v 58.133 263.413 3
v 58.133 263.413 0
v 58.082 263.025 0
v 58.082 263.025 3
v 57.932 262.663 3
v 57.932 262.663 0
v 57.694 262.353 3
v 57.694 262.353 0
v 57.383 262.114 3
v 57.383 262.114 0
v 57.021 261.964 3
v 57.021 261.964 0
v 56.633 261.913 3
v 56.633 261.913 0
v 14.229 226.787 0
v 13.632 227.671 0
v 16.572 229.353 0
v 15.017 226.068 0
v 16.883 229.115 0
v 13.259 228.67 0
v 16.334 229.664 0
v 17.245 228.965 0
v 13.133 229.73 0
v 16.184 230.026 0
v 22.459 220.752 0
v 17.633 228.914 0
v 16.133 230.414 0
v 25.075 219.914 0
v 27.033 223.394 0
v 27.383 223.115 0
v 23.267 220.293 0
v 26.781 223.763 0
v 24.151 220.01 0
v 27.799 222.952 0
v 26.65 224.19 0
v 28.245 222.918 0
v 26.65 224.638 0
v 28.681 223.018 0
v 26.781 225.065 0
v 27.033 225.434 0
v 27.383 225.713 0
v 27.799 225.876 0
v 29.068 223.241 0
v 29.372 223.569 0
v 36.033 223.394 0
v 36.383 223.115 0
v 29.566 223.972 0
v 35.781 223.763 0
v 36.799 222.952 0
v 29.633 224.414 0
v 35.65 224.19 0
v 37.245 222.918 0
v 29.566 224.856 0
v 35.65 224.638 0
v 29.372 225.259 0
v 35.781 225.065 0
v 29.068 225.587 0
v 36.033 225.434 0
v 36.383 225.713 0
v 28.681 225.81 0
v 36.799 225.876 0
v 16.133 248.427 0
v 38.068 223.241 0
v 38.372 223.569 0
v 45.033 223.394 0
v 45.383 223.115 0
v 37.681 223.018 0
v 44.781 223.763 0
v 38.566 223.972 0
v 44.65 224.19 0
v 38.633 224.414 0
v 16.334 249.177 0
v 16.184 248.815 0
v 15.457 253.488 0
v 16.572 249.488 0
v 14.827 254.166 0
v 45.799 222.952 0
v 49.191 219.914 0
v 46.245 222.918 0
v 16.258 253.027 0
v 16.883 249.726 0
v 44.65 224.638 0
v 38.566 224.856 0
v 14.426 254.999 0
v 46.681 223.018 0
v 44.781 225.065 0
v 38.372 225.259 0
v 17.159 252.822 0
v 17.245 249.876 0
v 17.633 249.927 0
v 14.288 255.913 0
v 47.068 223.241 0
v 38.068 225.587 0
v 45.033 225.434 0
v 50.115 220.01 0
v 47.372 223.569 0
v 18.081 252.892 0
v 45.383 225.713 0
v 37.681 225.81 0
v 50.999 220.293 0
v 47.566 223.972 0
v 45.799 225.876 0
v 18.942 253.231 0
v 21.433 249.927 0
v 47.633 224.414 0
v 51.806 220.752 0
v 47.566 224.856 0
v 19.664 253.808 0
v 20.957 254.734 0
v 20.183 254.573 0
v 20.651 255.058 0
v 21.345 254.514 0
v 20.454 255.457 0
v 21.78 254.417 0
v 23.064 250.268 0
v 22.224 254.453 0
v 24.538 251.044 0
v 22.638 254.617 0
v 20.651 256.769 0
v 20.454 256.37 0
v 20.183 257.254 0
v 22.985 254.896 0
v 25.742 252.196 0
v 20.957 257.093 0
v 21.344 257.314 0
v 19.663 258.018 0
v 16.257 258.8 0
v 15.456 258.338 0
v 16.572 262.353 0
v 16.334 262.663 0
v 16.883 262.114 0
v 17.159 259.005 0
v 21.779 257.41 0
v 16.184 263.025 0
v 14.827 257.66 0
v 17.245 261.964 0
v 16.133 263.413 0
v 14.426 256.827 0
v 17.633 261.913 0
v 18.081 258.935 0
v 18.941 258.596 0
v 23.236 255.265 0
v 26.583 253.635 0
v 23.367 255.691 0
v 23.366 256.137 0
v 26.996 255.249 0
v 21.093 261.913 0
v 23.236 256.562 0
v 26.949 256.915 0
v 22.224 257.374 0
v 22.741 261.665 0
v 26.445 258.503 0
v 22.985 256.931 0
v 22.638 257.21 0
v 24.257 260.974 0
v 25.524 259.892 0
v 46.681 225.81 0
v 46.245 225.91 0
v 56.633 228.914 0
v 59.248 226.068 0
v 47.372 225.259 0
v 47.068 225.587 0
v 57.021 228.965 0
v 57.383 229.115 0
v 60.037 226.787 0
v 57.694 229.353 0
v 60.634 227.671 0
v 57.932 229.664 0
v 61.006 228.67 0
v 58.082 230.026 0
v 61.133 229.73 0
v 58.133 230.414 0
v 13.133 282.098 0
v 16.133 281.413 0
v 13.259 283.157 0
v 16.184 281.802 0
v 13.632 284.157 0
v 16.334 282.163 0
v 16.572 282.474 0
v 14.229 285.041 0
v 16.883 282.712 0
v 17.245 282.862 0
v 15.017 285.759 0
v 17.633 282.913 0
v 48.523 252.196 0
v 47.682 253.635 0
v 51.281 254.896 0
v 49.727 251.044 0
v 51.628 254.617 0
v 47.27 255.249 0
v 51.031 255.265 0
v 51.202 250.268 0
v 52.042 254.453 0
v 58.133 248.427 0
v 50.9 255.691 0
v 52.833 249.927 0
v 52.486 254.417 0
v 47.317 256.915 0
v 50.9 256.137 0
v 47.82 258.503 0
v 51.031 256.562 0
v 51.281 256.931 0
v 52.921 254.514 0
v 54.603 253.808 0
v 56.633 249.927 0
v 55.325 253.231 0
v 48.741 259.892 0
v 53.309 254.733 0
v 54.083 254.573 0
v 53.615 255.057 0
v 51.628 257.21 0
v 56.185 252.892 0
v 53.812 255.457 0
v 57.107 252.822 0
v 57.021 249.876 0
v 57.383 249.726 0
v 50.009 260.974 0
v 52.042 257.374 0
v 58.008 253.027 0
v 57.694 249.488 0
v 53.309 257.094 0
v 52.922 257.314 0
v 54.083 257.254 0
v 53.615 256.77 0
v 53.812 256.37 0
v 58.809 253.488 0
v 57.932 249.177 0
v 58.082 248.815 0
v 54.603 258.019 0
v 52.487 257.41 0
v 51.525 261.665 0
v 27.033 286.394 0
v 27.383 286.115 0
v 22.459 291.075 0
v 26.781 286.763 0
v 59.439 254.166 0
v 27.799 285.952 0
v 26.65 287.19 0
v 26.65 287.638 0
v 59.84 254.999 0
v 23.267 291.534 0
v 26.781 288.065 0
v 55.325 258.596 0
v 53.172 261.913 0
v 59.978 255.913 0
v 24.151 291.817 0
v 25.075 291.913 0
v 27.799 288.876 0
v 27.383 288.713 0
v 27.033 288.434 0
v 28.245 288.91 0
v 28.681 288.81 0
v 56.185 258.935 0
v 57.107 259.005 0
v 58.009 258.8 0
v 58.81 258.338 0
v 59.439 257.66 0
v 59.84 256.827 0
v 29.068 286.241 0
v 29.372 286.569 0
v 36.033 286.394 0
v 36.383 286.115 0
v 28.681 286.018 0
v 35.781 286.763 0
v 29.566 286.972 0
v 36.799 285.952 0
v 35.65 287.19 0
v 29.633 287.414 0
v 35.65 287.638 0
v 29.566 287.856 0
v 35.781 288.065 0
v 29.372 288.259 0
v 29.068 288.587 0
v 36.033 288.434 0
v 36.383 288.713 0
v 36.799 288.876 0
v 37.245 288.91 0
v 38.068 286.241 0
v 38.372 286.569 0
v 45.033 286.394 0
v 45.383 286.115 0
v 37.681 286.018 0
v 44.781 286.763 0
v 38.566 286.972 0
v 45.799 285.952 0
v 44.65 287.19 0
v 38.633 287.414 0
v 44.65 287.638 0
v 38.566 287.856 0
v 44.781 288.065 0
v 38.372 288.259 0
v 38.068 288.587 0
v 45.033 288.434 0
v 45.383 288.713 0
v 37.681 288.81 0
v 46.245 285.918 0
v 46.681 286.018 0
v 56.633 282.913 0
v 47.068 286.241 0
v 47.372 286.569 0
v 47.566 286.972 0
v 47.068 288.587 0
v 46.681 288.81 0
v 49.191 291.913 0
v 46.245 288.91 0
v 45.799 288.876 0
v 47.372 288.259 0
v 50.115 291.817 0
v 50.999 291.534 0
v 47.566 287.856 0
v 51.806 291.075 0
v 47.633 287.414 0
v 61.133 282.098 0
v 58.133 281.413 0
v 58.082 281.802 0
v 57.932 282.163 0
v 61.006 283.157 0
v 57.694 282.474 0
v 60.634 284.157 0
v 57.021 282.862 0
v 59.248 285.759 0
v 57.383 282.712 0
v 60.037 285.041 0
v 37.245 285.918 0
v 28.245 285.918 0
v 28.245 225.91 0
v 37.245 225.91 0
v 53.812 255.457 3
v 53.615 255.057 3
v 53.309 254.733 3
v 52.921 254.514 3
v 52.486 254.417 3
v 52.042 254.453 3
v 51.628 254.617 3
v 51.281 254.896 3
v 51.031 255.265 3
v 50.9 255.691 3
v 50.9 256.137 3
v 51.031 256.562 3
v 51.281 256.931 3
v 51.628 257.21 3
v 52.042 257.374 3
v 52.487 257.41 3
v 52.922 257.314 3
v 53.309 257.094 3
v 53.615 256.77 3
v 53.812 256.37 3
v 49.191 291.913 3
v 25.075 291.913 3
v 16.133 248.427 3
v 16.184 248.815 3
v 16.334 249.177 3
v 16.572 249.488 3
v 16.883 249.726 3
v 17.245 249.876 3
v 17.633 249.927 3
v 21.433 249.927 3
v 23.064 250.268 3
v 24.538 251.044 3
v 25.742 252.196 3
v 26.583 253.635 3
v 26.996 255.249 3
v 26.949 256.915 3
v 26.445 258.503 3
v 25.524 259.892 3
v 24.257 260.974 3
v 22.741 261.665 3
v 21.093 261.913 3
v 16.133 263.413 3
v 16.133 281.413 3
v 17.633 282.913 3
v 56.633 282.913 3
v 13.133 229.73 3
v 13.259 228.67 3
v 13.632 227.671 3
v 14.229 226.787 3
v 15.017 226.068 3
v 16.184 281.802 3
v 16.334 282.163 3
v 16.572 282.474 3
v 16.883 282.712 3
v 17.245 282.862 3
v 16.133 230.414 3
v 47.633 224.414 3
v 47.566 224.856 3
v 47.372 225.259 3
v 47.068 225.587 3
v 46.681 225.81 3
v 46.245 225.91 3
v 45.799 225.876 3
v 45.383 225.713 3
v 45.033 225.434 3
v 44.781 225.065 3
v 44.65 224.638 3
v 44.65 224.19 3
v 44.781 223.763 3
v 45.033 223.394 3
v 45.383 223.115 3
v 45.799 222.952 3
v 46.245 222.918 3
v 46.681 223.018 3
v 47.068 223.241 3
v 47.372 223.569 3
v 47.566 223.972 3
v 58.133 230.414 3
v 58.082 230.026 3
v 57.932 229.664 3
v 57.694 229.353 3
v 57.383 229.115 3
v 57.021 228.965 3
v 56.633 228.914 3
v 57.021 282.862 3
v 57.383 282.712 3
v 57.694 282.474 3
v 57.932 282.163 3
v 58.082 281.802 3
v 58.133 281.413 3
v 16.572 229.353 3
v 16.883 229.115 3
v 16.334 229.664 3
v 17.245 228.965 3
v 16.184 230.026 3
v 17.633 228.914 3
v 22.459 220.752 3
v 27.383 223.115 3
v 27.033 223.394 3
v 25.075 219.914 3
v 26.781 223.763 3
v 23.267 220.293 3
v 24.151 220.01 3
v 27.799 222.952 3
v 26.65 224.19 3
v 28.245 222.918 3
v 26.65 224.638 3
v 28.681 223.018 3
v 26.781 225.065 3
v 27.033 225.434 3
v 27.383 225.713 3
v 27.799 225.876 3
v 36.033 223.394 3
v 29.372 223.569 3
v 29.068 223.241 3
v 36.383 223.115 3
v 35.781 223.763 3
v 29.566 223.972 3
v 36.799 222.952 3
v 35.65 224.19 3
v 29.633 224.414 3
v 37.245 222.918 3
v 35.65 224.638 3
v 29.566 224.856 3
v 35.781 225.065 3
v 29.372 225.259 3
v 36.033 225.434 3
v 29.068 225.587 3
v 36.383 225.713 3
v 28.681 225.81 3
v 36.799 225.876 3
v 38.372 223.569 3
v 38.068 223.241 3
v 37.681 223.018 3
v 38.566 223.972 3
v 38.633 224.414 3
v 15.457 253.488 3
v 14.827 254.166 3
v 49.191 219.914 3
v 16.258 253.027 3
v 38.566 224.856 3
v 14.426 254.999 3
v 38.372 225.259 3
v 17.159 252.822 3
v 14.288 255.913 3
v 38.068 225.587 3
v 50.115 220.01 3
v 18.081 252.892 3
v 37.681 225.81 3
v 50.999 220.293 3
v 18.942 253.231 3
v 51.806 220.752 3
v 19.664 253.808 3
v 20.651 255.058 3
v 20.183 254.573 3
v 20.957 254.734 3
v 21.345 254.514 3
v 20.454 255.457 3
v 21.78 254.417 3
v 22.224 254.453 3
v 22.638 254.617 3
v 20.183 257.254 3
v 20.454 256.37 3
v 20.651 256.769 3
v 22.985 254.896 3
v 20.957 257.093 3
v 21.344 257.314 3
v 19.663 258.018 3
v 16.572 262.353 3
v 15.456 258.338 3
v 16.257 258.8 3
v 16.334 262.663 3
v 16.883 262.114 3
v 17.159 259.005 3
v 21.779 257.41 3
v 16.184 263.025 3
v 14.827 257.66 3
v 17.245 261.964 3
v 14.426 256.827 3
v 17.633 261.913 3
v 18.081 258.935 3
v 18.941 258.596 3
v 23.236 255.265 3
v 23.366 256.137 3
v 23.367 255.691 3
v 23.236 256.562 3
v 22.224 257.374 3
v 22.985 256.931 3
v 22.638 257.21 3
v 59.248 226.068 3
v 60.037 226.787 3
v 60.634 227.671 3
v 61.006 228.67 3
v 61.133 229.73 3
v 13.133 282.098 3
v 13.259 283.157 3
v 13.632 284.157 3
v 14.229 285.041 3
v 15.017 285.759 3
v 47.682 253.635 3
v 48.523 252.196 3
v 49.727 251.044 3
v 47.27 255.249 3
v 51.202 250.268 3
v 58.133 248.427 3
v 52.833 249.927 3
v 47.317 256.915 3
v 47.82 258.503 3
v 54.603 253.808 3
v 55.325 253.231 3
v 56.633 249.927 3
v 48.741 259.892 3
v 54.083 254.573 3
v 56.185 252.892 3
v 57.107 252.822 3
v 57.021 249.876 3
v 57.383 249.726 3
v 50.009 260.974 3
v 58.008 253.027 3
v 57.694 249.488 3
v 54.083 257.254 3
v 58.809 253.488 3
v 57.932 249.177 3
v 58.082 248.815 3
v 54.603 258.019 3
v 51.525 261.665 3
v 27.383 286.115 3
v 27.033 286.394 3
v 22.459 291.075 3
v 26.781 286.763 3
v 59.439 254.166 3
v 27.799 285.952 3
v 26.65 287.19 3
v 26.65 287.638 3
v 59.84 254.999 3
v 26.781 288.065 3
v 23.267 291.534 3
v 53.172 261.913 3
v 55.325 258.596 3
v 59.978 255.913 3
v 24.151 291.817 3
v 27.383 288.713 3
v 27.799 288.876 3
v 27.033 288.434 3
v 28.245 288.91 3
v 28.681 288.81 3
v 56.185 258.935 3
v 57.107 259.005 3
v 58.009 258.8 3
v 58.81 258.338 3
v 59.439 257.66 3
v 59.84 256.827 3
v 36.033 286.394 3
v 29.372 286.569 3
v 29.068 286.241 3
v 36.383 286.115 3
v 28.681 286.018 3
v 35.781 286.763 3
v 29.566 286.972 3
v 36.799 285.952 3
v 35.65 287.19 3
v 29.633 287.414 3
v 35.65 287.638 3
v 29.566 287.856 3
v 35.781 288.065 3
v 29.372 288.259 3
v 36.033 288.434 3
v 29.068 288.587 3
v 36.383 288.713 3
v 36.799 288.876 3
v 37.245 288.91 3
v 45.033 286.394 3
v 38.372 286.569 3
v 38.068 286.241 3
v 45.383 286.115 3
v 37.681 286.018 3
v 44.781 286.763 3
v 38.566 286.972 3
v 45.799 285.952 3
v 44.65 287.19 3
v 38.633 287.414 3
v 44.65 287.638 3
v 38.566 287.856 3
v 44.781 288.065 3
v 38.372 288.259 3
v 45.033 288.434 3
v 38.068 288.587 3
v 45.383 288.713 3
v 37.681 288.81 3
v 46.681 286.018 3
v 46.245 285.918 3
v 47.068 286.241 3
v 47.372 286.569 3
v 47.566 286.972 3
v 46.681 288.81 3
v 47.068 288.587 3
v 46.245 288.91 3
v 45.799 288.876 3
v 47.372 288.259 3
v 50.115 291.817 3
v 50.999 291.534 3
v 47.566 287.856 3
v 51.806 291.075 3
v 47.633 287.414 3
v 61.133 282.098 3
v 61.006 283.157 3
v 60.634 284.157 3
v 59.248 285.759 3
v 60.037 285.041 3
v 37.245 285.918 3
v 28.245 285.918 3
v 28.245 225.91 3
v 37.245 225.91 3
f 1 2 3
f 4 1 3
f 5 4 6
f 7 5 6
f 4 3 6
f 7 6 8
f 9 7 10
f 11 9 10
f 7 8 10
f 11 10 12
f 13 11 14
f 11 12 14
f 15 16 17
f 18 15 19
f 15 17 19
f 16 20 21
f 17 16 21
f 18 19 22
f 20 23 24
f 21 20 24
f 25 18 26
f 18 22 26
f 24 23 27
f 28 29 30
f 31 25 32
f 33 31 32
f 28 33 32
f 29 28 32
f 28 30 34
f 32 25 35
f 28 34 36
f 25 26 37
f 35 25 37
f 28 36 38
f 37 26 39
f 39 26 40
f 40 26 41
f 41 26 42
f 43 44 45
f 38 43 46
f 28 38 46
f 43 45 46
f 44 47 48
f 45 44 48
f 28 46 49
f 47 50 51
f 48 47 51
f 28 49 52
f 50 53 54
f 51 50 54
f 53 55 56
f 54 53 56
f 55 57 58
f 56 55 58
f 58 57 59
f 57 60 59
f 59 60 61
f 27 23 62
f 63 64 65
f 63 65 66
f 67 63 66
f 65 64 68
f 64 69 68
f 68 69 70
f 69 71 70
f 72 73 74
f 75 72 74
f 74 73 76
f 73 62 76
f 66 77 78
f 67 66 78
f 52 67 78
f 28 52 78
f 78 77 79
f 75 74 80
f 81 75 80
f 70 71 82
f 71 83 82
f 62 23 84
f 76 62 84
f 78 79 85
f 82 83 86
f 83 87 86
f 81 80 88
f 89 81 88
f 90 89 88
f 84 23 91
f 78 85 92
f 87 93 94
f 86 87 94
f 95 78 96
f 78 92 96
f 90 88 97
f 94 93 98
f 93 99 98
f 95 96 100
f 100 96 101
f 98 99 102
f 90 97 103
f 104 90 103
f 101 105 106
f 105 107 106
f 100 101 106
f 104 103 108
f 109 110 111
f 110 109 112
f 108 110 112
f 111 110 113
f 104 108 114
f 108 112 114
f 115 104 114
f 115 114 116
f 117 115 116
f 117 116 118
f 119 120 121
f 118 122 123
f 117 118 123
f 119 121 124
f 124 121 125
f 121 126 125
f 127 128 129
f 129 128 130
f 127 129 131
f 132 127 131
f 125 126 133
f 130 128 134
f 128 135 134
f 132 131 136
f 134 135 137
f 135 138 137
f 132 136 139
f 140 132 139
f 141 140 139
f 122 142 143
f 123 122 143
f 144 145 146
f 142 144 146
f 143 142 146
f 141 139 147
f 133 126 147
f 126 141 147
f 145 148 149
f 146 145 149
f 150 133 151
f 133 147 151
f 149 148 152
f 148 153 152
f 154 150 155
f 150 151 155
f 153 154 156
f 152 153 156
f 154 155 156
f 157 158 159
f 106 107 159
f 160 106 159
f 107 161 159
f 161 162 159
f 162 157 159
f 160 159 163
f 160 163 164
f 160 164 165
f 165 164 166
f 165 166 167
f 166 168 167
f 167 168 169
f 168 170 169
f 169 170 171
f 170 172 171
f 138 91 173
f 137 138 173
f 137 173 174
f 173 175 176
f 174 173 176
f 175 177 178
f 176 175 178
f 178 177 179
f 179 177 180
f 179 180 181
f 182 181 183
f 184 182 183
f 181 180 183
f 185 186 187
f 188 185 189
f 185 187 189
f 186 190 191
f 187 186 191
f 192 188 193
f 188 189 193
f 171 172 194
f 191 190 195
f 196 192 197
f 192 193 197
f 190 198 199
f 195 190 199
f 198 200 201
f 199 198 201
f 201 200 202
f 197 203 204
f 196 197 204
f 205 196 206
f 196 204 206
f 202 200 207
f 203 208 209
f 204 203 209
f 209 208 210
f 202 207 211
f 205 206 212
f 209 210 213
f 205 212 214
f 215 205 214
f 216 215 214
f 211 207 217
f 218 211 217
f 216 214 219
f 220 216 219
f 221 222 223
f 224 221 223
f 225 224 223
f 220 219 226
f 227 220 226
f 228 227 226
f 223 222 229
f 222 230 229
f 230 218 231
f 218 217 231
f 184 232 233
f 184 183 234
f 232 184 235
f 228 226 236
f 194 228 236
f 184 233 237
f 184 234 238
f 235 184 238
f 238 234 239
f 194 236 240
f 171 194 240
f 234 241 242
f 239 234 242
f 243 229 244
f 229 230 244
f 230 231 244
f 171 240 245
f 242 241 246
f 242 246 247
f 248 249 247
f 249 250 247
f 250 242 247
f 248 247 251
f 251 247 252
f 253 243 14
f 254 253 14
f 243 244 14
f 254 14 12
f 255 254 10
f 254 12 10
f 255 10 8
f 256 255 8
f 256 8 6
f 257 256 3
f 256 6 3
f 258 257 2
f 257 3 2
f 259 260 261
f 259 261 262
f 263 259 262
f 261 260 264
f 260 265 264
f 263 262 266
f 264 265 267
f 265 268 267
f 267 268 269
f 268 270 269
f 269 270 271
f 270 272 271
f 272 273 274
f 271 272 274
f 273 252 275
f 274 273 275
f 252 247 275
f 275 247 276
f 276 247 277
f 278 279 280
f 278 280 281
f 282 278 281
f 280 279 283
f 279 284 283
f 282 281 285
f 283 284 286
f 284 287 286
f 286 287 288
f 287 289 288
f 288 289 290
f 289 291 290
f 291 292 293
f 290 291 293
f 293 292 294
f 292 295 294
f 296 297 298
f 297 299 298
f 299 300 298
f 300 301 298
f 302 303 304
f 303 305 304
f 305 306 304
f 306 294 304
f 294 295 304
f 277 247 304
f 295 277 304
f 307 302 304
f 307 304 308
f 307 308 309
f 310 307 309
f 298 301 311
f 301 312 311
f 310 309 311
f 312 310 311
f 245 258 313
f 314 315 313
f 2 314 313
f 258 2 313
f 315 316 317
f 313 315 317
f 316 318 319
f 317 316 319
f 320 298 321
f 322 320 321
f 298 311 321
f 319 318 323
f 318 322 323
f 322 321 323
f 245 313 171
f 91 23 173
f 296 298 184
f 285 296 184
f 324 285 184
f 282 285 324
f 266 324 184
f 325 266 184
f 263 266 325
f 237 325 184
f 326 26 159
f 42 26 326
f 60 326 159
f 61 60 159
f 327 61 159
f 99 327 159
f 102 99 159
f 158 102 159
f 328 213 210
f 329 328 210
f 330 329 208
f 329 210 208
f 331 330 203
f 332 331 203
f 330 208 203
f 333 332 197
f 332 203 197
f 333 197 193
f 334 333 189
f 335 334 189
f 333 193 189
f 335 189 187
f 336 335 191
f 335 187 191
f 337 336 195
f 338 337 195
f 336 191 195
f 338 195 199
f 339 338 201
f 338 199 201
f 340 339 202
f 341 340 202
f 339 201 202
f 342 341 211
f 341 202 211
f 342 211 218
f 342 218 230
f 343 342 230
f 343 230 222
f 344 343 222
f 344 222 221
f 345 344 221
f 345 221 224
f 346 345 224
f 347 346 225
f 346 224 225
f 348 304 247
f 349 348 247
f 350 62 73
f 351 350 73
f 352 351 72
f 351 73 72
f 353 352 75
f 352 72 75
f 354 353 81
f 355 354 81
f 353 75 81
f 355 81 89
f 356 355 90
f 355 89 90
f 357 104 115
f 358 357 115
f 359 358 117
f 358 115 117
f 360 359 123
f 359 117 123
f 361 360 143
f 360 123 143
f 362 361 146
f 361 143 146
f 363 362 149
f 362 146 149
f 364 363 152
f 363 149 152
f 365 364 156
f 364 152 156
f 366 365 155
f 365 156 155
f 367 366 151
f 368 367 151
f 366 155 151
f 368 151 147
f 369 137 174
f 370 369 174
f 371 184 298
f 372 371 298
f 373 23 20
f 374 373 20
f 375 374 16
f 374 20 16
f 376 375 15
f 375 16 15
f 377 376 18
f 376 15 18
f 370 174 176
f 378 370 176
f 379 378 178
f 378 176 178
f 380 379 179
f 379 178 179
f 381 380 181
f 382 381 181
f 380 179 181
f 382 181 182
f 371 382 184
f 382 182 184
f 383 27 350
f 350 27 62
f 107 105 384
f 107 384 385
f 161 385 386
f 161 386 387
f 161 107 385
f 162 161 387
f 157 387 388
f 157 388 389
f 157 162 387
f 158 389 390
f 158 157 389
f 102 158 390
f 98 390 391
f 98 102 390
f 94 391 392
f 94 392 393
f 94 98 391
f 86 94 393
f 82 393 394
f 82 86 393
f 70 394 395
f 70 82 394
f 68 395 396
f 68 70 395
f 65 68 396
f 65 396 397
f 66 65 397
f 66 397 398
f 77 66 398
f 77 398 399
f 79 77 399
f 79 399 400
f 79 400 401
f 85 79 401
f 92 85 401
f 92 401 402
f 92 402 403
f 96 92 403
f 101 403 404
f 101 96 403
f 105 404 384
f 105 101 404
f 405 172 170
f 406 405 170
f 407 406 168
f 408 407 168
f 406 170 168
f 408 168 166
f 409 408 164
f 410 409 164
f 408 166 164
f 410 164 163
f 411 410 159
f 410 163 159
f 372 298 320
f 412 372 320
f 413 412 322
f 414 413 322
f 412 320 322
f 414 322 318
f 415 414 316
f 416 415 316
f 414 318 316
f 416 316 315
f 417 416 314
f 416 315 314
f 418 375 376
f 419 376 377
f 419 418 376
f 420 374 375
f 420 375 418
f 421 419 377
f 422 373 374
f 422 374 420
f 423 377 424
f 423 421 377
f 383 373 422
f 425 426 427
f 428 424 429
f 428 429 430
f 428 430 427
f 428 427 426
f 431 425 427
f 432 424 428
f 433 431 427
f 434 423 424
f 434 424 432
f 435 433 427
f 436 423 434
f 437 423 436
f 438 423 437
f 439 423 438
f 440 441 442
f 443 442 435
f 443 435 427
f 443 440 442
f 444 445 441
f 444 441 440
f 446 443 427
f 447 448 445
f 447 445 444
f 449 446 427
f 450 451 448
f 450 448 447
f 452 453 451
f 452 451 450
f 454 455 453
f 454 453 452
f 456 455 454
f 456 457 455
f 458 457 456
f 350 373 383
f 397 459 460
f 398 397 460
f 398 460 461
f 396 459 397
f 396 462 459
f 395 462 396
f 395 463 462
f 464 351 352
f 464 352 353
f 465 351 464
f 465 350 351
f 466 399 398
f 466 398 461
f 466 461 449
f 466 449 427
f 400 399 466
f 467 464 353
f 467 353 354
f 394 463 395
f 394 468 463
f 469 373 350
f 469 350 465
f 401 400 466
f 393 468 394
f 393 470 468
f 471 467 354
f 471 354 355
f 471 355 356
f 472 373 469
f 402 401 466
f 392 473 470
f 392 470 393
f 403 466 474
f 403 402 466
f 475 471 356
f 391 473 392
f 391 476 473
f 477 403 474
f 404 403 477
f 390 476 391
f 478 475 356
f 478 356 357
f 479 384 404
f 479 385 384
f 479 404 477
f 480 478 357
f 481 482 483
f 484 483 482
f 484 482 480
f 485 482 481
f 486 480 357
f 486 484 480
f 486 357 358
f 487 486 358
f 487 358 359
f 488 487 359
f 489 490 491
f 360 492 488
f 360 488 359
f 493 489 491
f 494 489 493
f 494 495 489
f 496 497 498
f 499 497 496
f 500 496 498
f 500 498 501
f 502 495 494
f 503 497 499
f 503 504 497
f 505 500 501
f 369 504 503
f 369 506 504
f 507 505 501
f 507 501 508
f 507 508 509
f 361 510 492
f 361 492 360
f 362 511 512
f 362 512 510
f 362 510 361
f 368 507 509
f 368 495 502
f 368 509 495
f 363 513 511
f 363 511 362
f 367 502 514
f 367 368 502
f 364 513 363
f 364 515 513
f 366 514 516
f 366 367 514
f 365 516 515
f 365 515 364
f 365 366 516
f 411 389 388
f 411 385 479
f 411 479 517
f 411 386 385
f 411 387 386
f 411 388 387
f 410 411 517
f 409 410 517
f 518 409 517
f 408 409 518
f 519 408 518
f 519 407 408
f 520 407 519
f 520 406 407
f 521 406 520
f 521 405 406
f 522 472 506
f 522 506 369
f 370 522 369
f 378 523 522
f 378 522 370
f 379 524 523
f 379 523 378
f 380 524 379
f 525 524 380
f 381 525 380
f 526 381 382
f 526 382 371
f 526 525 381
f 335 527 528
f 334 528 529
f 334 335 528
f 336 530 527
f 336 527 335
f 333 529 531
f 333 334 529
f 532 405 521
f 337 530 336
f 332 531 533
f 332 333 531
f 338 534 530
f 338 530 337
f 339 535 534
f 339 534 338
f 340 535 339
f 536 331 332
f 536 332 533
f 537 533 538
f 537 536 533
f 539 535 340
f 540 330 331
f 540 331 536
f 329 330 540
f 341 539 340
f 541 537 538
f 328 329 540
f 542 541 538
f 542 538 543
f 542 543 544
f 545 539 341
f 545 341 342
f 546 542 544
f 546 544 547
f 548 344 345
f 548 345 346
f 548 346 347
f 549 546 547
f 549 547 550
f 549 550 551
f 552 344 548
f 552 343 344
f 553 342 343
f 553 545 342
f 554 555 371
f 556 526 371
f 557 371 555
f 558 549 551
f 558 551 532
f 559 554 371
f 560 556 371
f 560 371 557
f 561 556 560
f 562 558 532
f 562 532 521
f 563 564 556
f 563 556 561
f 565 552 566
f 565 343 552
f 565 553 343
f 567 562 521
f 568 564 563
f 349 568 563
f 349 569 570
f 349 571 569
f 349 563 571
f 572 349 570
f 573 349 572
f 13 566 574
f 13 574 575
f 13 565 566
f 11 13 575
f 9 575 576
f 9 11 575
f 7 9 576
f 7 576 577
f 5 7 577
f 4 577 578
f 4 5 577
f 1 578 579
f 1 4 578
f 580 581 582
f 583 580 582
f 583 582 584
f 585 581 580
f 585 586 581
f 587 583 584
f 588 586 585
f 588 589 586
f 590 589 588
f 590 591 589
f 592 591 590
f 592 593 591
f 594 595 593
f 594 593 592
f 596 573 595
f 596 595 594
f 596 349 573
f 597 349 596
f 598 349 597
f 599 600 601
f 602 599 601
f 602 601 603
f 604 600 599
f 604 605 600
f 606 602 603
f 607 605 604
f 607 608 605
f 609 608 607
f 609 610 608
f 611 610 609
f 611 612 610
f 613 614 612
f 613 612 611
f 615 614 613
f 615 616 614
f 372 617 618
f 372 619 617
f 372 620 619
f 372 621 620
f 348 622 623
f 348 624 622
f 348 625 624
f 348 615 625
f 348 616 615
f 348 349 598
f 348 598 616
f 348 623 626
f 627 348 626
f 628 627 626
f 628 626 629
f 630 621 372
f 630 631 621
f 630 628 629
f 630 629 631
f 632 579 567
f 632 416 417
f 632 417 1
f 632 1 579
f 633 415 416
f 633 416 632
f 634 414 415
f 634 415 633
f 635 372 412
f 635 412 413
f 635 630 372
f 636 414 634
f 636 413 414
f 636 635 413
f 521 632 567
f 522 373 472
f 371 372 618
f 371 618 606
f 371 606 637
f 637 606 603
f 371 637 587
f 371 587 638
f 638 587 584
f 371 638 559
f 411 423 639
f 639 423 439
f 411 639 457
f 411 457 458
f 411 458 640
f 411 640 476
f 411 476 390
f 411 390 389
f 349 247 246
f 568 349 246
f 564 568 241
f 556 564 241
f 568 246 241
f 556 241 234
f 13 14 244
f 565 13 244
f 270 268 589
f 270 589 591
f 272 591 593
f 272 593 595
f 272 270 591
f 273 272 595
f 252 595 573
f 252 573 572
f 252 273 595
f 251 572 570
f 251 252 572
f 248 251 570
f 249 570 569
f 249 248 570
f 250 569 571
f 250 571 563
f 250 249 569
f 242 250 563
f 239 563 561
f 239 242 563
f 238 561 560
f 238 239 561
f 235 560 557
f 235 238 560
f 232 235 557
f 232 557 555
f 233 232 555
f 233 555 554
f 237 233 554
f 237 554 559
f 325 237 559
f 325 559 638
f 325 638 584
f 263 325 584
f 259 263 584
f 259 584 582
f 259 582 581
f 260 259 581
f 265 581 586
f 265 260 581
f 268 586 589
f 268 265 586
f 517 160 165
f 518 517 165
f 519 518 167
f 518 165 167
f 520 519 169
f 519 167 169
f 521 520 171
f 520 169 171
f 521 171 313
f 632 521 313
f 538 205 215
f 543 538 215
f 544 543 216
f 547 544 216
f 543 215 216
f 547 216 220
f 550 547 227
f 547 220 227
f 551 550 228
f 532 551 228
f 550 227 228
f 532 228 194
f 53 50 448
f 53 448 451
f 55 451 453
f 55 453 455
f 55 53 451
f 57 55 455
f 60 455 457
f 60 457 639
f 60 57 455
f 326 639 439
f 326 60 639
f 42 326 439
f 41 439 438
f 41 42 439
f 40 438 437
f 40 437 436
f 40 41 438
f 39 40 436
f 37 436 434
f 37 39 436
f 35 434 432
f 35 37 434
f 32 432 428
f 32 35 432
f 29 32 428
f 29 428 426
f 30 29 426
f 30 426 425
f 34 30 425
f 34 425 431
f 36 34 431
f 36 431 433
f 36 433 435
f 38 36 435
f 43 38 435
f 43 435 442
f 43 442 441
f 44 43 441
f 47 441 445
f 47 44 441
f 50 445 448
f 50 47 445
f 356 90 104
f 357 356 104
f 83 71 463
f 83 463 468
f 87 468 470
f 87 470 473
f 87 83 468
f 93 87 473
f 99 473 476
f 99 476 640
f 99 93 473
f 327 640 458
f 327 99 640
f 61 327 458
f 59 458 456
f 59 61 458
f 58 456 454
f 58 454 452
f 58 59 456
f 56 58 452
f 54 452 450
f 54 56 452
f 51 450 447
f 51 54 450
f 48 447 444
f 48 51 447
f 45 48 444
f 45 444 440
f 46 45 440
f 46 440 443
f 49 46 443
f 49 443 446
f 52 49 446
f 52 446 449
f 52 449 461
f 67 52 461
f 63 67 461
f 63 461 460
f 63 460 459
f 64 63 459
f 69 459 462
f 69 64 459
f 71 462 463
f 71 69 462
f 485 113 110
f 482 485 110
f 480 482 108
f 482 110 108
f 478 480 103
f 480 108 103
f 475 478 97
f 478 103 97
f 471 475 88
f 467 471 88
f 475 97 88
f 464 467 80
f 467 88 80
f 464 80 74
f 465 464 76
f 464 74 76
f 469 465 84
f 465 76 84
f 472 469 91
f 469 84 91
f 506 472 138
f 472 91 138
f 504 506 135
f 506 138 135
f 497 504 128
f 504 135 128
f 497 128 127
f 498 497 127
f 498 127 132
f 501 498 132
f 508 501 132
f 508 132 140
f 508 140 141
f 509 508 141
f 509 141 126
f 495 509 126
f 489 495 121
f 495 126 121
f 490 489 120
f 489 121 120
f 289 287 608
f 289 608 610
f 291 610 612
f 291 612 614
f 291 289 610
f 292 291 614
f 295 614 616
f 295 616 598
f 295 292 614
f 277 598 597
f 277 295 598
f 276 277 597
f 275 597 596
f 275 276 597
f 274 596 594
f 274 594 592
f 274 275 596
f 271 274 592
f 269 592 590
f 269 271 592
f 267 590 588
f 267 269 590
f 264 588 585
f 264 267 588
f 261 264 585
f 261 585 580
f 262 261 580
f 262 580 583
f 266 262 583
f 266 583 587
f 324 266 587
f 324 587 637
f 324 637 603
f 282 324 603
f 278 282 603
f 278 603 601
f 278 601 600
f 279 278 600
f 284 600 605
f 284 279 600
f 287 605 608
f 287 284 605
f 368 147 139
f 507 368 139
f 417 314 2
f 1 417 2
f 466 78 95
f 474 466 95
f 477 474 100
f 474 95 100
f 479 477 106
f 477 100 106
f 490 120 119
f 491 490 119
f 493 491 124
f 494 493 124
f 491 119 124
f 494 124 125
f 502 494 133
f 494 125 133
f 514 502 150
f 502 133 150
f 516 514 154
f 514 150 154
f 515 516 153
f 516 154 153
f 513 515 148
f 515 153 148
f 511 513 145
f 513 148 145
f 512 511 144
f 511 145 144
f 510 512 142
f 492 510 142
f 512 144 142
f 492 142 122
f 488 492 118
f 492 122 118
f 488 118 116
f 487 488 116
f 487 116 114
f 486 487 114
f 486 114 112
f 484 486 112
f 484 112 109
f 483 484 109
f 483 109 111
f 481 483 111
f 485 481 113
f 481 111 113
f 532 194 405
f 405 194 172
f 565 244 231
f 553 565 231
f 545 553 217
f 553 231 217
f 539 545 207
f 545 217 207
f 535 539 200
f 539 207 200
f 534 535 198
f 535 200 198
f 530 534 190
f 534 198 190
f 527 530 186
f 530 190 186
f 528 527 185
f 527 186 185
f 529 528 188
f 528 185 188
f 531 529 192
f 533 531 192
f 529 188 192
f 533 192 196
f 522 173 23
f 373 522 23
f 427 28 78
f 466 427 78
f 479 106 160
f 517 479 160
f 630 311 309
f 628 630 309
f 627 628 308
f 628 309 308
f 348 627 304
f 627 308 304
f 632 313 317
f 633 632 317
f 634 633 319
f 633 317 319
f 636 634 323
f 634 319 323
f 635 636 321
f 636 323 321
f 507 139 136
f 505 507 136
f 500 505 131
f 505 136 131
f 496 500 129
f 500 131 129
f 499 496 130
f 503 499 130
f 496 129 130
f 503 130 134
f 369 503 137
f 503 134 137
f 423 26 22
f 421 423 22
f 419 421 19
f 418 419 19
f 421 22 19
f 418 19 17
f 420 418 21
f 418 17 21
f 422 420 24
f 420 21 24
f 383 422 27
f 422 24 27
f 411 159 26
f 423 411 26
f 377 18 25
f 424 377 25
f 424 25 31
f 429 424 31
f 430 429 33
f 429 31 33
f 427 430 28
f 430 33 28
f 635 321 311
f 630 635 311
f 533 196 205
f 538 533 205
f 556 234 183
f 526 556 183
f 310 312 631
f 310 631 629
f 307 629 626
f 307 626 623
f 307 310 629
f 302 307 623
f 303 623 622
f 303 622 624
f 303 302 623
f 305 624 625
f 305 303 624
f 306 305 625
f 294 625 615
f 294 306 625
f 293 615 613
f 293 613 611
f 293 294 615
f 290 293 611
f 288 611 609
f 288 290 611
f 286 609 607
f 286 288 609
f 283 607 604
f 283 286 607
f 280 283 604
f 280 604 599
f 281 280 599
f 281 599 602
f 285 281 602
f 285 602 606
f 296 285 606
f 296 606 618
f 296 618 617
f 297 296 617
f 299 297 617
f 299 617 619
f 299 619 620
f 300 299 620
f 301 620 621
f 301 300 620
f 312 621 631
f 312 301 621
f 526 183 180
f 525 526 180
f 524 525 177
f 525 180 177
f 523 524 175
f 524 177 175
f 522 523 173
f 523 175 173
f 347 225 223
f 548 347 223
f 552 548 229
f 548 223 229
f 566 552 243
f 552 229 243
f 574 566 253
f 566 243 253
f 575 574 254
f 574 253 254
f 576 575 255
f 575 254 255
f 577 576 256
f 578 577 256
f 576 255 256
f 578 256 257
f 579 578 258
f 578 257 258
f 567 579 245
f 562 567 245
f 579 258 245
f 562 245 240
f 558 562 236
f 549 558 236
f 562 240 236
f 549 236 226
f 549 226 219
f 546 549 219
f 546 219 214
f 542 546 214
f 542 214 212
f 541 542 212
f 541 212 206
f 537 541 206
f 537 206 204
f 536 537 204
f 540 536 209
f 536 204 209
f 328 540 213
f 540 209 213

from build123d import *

# Parameters (mm, degrees)
MODEL_R                 = 1.5
SALIENTE_EXTRUIR1_DEPTH = 3


with BuildPart() as part:
    # Model → Saliente-Extruir1 (new body)
    with BuildSketch(Plane.XY):
        with BuildLine():
            ThreePointArc((59.248437734, 226.067919021), (60.634120255, 227.670602527), (61.132865862, 229.729719641))
            Line((61.132865862, 229.729719641), (61.132865862, 282.097548174))
            ThreePointArc((61.132865862, 282.097548174), (60.634120255, 284.156665288), (59.248437734, 285.759348794))
            Line((59.248437734, 285.759348794), (51.806344994, 291.075129323))
            ThreePointArc((51.806344994, 291.075129323), (50.564071562, 291.698658491), (49.190773122, 291.913328703))
            Line((49.190773122, 291.913328703), (25.074958603, 291.913328703))
            ThreePointArc((25.074958603, 291.913328703), (23.701660163, 291.698658491), (22.459386731, 291.075129323))
            Line((22.459386731, 291.075129323), (15.017293991, 285.759348794))
            ThreePointArc((15.017293991, 285.759348794), (13.63161147, 284.156665288), (13.132865862, 282.097548174))
            Line((13.132865862, 282.097548174), (13.132865862, 229.729719641))
            ThreePointArc((13.132865862, 229.729719641), (13.63161147, 227.670602527), (15.017293991, 226.067919021))
            Line((15.017293991, 226.067919021), (22.459386731, 220.752138492))
            ThreePointArc((22.459386731, 220.752138492), (23.701660163, 220.128609324), (25.074958603, 219.913939113))
            Line((25.074958603, 219.913939113), (49.190773122, 219.913939113))
            ThreePointArc((49.190773122, 219.913939113), (50.564071562, 220.128609324), (51.806344994, 220.752138492))
            Line((51.806344994, 220.752138492), (59.248437734, 226.067919021))
        make_face()
        with Locations((28.132865862, 224.413939113)):
            Circle(MODEL_R, mode=Mode.SUBTRACT)
        with BuildLine():
            ThreePointArc((20.454104838, 256.369594574), (23.38312543, 255.913735735), (20.454166764, 255.457479185))
            ThreePointArc((20.454166764, 255.457479185), (14.28786587, 255.913118236), (20.454104838, 256.369594574))
        make_face(mode=Mode.SUBTRACT)
        with Locations((37.132865862, 224.413939113)):
            Circle(MODEL_R, mode=Mode.SUBTRACT)
        with Locations((46.132865862, 224.413939113)):
            Circle(MODEL_R, mode=Mode.SUBTRACT)
        with BuildLine():
            ThreePointArc((53.811907003, 255.45692477), (50.883125437, 255.913735745), (53.81196901, 256.370148994))
            ThreePointArc((53.81196901, 256.370148994), (59.978125426, 255.913118206), (53.811907003, 255.45692477))
        make_face(mode=Mode.SUBTRACT)
        with Locations((28.132865862, 287.413939112)):
            Circle(MODEL_R, mode=Mode.SUBTRACT)
        with BuildLine():
            Line((16.132865862, 263.413328703), (16.132865862, 281.413328703))
            ThreePointArc((16.132865862, 281.413328703), (16.572205691, 282.473988875), (17.632865862, 282.913328703))
            Line((17.632865862, 282.913328703), (56.632865862, 282.913328703))
            ThreePointArc((56.632865862, 282.913328703), (57.693526034, 282.473988875), (58.132865862, 281.413328703))
            Line((58.132865862, 281.413328703), (58.132865862, 263.413328703))
            ThreePointArc((58.132865862, 263.413328703), (57.693526034, 262.352668531), (56.632865862, 261.913328703))
            Line((56.632865862, 261.913328703), (53.293383336, 261.913328703))
            Line((53.293383336, 261.913328703), (53.172348389, 261.913328703))
            ThreePointArc((53.172348389, 261.913328703), (47.235274136, 256.083614768), (52.832637551, 249.926997348))
            Line((52.832637551, 249.926997348), (56.632865862, 249.926997348))
            ThreePointArc((56.632865862, 249.926997348), (57.693526034, 249.48765752), (58.132865862, 248.426997348))
            Line((58.132865862, 248.426997348), (58.132865862, 230.413939113))
            ThreePointArc((58.132865862, 230.413939113), (57.693526034, 229.353278941), (56.632865862, 228.913939113))
            Line((56.632865862, 228.913939113), (17.632865862, 228.913939113))
            ThreePointArc((17.632865862, 228.913939113), (16.572205691, 229.353278941), (16.132865862, 230.413939113))
            Line((16.132865862, 230.413939113), (16.132865862, 248.426997348))
            ThreePointArc((16.132865862, 248.426997348), (16.572205691, 249.48765752), (17.632865862, 249.926997348))
            Line((17.632865862, 249.926997348), (21.433094174, 249.926997348))
            ThreePointArc((21.433094174, 249.926997348), (27.030457589, 256.083614768), (21.093383336, 261.913328703))
            Line((21.093383336, 261.913328703), (20.972348389, 261.913328703))
            Line((20.972348389, 261.913328703), (17.632865862, 261.913328703))
            ThreePointArc((17.632865862, 261.913328703), (16.572205691, 262.352668531), (16.132865862, 263.413328703))
        make_face(mode=Mode.SUBTRACT)
        with Locations((37.132865862, 287.413939112)):
            Circle(MODEL_R, mode=Mode.SUBTRACT)
        with Locations((46.132865862, 287.413939112)):
            Circle(MODEL_R, mode=Mode.SUBTRACT)
    extrude(amount=SALIENTE_EXTRUIR1_DEPTH)


solid = part.part
